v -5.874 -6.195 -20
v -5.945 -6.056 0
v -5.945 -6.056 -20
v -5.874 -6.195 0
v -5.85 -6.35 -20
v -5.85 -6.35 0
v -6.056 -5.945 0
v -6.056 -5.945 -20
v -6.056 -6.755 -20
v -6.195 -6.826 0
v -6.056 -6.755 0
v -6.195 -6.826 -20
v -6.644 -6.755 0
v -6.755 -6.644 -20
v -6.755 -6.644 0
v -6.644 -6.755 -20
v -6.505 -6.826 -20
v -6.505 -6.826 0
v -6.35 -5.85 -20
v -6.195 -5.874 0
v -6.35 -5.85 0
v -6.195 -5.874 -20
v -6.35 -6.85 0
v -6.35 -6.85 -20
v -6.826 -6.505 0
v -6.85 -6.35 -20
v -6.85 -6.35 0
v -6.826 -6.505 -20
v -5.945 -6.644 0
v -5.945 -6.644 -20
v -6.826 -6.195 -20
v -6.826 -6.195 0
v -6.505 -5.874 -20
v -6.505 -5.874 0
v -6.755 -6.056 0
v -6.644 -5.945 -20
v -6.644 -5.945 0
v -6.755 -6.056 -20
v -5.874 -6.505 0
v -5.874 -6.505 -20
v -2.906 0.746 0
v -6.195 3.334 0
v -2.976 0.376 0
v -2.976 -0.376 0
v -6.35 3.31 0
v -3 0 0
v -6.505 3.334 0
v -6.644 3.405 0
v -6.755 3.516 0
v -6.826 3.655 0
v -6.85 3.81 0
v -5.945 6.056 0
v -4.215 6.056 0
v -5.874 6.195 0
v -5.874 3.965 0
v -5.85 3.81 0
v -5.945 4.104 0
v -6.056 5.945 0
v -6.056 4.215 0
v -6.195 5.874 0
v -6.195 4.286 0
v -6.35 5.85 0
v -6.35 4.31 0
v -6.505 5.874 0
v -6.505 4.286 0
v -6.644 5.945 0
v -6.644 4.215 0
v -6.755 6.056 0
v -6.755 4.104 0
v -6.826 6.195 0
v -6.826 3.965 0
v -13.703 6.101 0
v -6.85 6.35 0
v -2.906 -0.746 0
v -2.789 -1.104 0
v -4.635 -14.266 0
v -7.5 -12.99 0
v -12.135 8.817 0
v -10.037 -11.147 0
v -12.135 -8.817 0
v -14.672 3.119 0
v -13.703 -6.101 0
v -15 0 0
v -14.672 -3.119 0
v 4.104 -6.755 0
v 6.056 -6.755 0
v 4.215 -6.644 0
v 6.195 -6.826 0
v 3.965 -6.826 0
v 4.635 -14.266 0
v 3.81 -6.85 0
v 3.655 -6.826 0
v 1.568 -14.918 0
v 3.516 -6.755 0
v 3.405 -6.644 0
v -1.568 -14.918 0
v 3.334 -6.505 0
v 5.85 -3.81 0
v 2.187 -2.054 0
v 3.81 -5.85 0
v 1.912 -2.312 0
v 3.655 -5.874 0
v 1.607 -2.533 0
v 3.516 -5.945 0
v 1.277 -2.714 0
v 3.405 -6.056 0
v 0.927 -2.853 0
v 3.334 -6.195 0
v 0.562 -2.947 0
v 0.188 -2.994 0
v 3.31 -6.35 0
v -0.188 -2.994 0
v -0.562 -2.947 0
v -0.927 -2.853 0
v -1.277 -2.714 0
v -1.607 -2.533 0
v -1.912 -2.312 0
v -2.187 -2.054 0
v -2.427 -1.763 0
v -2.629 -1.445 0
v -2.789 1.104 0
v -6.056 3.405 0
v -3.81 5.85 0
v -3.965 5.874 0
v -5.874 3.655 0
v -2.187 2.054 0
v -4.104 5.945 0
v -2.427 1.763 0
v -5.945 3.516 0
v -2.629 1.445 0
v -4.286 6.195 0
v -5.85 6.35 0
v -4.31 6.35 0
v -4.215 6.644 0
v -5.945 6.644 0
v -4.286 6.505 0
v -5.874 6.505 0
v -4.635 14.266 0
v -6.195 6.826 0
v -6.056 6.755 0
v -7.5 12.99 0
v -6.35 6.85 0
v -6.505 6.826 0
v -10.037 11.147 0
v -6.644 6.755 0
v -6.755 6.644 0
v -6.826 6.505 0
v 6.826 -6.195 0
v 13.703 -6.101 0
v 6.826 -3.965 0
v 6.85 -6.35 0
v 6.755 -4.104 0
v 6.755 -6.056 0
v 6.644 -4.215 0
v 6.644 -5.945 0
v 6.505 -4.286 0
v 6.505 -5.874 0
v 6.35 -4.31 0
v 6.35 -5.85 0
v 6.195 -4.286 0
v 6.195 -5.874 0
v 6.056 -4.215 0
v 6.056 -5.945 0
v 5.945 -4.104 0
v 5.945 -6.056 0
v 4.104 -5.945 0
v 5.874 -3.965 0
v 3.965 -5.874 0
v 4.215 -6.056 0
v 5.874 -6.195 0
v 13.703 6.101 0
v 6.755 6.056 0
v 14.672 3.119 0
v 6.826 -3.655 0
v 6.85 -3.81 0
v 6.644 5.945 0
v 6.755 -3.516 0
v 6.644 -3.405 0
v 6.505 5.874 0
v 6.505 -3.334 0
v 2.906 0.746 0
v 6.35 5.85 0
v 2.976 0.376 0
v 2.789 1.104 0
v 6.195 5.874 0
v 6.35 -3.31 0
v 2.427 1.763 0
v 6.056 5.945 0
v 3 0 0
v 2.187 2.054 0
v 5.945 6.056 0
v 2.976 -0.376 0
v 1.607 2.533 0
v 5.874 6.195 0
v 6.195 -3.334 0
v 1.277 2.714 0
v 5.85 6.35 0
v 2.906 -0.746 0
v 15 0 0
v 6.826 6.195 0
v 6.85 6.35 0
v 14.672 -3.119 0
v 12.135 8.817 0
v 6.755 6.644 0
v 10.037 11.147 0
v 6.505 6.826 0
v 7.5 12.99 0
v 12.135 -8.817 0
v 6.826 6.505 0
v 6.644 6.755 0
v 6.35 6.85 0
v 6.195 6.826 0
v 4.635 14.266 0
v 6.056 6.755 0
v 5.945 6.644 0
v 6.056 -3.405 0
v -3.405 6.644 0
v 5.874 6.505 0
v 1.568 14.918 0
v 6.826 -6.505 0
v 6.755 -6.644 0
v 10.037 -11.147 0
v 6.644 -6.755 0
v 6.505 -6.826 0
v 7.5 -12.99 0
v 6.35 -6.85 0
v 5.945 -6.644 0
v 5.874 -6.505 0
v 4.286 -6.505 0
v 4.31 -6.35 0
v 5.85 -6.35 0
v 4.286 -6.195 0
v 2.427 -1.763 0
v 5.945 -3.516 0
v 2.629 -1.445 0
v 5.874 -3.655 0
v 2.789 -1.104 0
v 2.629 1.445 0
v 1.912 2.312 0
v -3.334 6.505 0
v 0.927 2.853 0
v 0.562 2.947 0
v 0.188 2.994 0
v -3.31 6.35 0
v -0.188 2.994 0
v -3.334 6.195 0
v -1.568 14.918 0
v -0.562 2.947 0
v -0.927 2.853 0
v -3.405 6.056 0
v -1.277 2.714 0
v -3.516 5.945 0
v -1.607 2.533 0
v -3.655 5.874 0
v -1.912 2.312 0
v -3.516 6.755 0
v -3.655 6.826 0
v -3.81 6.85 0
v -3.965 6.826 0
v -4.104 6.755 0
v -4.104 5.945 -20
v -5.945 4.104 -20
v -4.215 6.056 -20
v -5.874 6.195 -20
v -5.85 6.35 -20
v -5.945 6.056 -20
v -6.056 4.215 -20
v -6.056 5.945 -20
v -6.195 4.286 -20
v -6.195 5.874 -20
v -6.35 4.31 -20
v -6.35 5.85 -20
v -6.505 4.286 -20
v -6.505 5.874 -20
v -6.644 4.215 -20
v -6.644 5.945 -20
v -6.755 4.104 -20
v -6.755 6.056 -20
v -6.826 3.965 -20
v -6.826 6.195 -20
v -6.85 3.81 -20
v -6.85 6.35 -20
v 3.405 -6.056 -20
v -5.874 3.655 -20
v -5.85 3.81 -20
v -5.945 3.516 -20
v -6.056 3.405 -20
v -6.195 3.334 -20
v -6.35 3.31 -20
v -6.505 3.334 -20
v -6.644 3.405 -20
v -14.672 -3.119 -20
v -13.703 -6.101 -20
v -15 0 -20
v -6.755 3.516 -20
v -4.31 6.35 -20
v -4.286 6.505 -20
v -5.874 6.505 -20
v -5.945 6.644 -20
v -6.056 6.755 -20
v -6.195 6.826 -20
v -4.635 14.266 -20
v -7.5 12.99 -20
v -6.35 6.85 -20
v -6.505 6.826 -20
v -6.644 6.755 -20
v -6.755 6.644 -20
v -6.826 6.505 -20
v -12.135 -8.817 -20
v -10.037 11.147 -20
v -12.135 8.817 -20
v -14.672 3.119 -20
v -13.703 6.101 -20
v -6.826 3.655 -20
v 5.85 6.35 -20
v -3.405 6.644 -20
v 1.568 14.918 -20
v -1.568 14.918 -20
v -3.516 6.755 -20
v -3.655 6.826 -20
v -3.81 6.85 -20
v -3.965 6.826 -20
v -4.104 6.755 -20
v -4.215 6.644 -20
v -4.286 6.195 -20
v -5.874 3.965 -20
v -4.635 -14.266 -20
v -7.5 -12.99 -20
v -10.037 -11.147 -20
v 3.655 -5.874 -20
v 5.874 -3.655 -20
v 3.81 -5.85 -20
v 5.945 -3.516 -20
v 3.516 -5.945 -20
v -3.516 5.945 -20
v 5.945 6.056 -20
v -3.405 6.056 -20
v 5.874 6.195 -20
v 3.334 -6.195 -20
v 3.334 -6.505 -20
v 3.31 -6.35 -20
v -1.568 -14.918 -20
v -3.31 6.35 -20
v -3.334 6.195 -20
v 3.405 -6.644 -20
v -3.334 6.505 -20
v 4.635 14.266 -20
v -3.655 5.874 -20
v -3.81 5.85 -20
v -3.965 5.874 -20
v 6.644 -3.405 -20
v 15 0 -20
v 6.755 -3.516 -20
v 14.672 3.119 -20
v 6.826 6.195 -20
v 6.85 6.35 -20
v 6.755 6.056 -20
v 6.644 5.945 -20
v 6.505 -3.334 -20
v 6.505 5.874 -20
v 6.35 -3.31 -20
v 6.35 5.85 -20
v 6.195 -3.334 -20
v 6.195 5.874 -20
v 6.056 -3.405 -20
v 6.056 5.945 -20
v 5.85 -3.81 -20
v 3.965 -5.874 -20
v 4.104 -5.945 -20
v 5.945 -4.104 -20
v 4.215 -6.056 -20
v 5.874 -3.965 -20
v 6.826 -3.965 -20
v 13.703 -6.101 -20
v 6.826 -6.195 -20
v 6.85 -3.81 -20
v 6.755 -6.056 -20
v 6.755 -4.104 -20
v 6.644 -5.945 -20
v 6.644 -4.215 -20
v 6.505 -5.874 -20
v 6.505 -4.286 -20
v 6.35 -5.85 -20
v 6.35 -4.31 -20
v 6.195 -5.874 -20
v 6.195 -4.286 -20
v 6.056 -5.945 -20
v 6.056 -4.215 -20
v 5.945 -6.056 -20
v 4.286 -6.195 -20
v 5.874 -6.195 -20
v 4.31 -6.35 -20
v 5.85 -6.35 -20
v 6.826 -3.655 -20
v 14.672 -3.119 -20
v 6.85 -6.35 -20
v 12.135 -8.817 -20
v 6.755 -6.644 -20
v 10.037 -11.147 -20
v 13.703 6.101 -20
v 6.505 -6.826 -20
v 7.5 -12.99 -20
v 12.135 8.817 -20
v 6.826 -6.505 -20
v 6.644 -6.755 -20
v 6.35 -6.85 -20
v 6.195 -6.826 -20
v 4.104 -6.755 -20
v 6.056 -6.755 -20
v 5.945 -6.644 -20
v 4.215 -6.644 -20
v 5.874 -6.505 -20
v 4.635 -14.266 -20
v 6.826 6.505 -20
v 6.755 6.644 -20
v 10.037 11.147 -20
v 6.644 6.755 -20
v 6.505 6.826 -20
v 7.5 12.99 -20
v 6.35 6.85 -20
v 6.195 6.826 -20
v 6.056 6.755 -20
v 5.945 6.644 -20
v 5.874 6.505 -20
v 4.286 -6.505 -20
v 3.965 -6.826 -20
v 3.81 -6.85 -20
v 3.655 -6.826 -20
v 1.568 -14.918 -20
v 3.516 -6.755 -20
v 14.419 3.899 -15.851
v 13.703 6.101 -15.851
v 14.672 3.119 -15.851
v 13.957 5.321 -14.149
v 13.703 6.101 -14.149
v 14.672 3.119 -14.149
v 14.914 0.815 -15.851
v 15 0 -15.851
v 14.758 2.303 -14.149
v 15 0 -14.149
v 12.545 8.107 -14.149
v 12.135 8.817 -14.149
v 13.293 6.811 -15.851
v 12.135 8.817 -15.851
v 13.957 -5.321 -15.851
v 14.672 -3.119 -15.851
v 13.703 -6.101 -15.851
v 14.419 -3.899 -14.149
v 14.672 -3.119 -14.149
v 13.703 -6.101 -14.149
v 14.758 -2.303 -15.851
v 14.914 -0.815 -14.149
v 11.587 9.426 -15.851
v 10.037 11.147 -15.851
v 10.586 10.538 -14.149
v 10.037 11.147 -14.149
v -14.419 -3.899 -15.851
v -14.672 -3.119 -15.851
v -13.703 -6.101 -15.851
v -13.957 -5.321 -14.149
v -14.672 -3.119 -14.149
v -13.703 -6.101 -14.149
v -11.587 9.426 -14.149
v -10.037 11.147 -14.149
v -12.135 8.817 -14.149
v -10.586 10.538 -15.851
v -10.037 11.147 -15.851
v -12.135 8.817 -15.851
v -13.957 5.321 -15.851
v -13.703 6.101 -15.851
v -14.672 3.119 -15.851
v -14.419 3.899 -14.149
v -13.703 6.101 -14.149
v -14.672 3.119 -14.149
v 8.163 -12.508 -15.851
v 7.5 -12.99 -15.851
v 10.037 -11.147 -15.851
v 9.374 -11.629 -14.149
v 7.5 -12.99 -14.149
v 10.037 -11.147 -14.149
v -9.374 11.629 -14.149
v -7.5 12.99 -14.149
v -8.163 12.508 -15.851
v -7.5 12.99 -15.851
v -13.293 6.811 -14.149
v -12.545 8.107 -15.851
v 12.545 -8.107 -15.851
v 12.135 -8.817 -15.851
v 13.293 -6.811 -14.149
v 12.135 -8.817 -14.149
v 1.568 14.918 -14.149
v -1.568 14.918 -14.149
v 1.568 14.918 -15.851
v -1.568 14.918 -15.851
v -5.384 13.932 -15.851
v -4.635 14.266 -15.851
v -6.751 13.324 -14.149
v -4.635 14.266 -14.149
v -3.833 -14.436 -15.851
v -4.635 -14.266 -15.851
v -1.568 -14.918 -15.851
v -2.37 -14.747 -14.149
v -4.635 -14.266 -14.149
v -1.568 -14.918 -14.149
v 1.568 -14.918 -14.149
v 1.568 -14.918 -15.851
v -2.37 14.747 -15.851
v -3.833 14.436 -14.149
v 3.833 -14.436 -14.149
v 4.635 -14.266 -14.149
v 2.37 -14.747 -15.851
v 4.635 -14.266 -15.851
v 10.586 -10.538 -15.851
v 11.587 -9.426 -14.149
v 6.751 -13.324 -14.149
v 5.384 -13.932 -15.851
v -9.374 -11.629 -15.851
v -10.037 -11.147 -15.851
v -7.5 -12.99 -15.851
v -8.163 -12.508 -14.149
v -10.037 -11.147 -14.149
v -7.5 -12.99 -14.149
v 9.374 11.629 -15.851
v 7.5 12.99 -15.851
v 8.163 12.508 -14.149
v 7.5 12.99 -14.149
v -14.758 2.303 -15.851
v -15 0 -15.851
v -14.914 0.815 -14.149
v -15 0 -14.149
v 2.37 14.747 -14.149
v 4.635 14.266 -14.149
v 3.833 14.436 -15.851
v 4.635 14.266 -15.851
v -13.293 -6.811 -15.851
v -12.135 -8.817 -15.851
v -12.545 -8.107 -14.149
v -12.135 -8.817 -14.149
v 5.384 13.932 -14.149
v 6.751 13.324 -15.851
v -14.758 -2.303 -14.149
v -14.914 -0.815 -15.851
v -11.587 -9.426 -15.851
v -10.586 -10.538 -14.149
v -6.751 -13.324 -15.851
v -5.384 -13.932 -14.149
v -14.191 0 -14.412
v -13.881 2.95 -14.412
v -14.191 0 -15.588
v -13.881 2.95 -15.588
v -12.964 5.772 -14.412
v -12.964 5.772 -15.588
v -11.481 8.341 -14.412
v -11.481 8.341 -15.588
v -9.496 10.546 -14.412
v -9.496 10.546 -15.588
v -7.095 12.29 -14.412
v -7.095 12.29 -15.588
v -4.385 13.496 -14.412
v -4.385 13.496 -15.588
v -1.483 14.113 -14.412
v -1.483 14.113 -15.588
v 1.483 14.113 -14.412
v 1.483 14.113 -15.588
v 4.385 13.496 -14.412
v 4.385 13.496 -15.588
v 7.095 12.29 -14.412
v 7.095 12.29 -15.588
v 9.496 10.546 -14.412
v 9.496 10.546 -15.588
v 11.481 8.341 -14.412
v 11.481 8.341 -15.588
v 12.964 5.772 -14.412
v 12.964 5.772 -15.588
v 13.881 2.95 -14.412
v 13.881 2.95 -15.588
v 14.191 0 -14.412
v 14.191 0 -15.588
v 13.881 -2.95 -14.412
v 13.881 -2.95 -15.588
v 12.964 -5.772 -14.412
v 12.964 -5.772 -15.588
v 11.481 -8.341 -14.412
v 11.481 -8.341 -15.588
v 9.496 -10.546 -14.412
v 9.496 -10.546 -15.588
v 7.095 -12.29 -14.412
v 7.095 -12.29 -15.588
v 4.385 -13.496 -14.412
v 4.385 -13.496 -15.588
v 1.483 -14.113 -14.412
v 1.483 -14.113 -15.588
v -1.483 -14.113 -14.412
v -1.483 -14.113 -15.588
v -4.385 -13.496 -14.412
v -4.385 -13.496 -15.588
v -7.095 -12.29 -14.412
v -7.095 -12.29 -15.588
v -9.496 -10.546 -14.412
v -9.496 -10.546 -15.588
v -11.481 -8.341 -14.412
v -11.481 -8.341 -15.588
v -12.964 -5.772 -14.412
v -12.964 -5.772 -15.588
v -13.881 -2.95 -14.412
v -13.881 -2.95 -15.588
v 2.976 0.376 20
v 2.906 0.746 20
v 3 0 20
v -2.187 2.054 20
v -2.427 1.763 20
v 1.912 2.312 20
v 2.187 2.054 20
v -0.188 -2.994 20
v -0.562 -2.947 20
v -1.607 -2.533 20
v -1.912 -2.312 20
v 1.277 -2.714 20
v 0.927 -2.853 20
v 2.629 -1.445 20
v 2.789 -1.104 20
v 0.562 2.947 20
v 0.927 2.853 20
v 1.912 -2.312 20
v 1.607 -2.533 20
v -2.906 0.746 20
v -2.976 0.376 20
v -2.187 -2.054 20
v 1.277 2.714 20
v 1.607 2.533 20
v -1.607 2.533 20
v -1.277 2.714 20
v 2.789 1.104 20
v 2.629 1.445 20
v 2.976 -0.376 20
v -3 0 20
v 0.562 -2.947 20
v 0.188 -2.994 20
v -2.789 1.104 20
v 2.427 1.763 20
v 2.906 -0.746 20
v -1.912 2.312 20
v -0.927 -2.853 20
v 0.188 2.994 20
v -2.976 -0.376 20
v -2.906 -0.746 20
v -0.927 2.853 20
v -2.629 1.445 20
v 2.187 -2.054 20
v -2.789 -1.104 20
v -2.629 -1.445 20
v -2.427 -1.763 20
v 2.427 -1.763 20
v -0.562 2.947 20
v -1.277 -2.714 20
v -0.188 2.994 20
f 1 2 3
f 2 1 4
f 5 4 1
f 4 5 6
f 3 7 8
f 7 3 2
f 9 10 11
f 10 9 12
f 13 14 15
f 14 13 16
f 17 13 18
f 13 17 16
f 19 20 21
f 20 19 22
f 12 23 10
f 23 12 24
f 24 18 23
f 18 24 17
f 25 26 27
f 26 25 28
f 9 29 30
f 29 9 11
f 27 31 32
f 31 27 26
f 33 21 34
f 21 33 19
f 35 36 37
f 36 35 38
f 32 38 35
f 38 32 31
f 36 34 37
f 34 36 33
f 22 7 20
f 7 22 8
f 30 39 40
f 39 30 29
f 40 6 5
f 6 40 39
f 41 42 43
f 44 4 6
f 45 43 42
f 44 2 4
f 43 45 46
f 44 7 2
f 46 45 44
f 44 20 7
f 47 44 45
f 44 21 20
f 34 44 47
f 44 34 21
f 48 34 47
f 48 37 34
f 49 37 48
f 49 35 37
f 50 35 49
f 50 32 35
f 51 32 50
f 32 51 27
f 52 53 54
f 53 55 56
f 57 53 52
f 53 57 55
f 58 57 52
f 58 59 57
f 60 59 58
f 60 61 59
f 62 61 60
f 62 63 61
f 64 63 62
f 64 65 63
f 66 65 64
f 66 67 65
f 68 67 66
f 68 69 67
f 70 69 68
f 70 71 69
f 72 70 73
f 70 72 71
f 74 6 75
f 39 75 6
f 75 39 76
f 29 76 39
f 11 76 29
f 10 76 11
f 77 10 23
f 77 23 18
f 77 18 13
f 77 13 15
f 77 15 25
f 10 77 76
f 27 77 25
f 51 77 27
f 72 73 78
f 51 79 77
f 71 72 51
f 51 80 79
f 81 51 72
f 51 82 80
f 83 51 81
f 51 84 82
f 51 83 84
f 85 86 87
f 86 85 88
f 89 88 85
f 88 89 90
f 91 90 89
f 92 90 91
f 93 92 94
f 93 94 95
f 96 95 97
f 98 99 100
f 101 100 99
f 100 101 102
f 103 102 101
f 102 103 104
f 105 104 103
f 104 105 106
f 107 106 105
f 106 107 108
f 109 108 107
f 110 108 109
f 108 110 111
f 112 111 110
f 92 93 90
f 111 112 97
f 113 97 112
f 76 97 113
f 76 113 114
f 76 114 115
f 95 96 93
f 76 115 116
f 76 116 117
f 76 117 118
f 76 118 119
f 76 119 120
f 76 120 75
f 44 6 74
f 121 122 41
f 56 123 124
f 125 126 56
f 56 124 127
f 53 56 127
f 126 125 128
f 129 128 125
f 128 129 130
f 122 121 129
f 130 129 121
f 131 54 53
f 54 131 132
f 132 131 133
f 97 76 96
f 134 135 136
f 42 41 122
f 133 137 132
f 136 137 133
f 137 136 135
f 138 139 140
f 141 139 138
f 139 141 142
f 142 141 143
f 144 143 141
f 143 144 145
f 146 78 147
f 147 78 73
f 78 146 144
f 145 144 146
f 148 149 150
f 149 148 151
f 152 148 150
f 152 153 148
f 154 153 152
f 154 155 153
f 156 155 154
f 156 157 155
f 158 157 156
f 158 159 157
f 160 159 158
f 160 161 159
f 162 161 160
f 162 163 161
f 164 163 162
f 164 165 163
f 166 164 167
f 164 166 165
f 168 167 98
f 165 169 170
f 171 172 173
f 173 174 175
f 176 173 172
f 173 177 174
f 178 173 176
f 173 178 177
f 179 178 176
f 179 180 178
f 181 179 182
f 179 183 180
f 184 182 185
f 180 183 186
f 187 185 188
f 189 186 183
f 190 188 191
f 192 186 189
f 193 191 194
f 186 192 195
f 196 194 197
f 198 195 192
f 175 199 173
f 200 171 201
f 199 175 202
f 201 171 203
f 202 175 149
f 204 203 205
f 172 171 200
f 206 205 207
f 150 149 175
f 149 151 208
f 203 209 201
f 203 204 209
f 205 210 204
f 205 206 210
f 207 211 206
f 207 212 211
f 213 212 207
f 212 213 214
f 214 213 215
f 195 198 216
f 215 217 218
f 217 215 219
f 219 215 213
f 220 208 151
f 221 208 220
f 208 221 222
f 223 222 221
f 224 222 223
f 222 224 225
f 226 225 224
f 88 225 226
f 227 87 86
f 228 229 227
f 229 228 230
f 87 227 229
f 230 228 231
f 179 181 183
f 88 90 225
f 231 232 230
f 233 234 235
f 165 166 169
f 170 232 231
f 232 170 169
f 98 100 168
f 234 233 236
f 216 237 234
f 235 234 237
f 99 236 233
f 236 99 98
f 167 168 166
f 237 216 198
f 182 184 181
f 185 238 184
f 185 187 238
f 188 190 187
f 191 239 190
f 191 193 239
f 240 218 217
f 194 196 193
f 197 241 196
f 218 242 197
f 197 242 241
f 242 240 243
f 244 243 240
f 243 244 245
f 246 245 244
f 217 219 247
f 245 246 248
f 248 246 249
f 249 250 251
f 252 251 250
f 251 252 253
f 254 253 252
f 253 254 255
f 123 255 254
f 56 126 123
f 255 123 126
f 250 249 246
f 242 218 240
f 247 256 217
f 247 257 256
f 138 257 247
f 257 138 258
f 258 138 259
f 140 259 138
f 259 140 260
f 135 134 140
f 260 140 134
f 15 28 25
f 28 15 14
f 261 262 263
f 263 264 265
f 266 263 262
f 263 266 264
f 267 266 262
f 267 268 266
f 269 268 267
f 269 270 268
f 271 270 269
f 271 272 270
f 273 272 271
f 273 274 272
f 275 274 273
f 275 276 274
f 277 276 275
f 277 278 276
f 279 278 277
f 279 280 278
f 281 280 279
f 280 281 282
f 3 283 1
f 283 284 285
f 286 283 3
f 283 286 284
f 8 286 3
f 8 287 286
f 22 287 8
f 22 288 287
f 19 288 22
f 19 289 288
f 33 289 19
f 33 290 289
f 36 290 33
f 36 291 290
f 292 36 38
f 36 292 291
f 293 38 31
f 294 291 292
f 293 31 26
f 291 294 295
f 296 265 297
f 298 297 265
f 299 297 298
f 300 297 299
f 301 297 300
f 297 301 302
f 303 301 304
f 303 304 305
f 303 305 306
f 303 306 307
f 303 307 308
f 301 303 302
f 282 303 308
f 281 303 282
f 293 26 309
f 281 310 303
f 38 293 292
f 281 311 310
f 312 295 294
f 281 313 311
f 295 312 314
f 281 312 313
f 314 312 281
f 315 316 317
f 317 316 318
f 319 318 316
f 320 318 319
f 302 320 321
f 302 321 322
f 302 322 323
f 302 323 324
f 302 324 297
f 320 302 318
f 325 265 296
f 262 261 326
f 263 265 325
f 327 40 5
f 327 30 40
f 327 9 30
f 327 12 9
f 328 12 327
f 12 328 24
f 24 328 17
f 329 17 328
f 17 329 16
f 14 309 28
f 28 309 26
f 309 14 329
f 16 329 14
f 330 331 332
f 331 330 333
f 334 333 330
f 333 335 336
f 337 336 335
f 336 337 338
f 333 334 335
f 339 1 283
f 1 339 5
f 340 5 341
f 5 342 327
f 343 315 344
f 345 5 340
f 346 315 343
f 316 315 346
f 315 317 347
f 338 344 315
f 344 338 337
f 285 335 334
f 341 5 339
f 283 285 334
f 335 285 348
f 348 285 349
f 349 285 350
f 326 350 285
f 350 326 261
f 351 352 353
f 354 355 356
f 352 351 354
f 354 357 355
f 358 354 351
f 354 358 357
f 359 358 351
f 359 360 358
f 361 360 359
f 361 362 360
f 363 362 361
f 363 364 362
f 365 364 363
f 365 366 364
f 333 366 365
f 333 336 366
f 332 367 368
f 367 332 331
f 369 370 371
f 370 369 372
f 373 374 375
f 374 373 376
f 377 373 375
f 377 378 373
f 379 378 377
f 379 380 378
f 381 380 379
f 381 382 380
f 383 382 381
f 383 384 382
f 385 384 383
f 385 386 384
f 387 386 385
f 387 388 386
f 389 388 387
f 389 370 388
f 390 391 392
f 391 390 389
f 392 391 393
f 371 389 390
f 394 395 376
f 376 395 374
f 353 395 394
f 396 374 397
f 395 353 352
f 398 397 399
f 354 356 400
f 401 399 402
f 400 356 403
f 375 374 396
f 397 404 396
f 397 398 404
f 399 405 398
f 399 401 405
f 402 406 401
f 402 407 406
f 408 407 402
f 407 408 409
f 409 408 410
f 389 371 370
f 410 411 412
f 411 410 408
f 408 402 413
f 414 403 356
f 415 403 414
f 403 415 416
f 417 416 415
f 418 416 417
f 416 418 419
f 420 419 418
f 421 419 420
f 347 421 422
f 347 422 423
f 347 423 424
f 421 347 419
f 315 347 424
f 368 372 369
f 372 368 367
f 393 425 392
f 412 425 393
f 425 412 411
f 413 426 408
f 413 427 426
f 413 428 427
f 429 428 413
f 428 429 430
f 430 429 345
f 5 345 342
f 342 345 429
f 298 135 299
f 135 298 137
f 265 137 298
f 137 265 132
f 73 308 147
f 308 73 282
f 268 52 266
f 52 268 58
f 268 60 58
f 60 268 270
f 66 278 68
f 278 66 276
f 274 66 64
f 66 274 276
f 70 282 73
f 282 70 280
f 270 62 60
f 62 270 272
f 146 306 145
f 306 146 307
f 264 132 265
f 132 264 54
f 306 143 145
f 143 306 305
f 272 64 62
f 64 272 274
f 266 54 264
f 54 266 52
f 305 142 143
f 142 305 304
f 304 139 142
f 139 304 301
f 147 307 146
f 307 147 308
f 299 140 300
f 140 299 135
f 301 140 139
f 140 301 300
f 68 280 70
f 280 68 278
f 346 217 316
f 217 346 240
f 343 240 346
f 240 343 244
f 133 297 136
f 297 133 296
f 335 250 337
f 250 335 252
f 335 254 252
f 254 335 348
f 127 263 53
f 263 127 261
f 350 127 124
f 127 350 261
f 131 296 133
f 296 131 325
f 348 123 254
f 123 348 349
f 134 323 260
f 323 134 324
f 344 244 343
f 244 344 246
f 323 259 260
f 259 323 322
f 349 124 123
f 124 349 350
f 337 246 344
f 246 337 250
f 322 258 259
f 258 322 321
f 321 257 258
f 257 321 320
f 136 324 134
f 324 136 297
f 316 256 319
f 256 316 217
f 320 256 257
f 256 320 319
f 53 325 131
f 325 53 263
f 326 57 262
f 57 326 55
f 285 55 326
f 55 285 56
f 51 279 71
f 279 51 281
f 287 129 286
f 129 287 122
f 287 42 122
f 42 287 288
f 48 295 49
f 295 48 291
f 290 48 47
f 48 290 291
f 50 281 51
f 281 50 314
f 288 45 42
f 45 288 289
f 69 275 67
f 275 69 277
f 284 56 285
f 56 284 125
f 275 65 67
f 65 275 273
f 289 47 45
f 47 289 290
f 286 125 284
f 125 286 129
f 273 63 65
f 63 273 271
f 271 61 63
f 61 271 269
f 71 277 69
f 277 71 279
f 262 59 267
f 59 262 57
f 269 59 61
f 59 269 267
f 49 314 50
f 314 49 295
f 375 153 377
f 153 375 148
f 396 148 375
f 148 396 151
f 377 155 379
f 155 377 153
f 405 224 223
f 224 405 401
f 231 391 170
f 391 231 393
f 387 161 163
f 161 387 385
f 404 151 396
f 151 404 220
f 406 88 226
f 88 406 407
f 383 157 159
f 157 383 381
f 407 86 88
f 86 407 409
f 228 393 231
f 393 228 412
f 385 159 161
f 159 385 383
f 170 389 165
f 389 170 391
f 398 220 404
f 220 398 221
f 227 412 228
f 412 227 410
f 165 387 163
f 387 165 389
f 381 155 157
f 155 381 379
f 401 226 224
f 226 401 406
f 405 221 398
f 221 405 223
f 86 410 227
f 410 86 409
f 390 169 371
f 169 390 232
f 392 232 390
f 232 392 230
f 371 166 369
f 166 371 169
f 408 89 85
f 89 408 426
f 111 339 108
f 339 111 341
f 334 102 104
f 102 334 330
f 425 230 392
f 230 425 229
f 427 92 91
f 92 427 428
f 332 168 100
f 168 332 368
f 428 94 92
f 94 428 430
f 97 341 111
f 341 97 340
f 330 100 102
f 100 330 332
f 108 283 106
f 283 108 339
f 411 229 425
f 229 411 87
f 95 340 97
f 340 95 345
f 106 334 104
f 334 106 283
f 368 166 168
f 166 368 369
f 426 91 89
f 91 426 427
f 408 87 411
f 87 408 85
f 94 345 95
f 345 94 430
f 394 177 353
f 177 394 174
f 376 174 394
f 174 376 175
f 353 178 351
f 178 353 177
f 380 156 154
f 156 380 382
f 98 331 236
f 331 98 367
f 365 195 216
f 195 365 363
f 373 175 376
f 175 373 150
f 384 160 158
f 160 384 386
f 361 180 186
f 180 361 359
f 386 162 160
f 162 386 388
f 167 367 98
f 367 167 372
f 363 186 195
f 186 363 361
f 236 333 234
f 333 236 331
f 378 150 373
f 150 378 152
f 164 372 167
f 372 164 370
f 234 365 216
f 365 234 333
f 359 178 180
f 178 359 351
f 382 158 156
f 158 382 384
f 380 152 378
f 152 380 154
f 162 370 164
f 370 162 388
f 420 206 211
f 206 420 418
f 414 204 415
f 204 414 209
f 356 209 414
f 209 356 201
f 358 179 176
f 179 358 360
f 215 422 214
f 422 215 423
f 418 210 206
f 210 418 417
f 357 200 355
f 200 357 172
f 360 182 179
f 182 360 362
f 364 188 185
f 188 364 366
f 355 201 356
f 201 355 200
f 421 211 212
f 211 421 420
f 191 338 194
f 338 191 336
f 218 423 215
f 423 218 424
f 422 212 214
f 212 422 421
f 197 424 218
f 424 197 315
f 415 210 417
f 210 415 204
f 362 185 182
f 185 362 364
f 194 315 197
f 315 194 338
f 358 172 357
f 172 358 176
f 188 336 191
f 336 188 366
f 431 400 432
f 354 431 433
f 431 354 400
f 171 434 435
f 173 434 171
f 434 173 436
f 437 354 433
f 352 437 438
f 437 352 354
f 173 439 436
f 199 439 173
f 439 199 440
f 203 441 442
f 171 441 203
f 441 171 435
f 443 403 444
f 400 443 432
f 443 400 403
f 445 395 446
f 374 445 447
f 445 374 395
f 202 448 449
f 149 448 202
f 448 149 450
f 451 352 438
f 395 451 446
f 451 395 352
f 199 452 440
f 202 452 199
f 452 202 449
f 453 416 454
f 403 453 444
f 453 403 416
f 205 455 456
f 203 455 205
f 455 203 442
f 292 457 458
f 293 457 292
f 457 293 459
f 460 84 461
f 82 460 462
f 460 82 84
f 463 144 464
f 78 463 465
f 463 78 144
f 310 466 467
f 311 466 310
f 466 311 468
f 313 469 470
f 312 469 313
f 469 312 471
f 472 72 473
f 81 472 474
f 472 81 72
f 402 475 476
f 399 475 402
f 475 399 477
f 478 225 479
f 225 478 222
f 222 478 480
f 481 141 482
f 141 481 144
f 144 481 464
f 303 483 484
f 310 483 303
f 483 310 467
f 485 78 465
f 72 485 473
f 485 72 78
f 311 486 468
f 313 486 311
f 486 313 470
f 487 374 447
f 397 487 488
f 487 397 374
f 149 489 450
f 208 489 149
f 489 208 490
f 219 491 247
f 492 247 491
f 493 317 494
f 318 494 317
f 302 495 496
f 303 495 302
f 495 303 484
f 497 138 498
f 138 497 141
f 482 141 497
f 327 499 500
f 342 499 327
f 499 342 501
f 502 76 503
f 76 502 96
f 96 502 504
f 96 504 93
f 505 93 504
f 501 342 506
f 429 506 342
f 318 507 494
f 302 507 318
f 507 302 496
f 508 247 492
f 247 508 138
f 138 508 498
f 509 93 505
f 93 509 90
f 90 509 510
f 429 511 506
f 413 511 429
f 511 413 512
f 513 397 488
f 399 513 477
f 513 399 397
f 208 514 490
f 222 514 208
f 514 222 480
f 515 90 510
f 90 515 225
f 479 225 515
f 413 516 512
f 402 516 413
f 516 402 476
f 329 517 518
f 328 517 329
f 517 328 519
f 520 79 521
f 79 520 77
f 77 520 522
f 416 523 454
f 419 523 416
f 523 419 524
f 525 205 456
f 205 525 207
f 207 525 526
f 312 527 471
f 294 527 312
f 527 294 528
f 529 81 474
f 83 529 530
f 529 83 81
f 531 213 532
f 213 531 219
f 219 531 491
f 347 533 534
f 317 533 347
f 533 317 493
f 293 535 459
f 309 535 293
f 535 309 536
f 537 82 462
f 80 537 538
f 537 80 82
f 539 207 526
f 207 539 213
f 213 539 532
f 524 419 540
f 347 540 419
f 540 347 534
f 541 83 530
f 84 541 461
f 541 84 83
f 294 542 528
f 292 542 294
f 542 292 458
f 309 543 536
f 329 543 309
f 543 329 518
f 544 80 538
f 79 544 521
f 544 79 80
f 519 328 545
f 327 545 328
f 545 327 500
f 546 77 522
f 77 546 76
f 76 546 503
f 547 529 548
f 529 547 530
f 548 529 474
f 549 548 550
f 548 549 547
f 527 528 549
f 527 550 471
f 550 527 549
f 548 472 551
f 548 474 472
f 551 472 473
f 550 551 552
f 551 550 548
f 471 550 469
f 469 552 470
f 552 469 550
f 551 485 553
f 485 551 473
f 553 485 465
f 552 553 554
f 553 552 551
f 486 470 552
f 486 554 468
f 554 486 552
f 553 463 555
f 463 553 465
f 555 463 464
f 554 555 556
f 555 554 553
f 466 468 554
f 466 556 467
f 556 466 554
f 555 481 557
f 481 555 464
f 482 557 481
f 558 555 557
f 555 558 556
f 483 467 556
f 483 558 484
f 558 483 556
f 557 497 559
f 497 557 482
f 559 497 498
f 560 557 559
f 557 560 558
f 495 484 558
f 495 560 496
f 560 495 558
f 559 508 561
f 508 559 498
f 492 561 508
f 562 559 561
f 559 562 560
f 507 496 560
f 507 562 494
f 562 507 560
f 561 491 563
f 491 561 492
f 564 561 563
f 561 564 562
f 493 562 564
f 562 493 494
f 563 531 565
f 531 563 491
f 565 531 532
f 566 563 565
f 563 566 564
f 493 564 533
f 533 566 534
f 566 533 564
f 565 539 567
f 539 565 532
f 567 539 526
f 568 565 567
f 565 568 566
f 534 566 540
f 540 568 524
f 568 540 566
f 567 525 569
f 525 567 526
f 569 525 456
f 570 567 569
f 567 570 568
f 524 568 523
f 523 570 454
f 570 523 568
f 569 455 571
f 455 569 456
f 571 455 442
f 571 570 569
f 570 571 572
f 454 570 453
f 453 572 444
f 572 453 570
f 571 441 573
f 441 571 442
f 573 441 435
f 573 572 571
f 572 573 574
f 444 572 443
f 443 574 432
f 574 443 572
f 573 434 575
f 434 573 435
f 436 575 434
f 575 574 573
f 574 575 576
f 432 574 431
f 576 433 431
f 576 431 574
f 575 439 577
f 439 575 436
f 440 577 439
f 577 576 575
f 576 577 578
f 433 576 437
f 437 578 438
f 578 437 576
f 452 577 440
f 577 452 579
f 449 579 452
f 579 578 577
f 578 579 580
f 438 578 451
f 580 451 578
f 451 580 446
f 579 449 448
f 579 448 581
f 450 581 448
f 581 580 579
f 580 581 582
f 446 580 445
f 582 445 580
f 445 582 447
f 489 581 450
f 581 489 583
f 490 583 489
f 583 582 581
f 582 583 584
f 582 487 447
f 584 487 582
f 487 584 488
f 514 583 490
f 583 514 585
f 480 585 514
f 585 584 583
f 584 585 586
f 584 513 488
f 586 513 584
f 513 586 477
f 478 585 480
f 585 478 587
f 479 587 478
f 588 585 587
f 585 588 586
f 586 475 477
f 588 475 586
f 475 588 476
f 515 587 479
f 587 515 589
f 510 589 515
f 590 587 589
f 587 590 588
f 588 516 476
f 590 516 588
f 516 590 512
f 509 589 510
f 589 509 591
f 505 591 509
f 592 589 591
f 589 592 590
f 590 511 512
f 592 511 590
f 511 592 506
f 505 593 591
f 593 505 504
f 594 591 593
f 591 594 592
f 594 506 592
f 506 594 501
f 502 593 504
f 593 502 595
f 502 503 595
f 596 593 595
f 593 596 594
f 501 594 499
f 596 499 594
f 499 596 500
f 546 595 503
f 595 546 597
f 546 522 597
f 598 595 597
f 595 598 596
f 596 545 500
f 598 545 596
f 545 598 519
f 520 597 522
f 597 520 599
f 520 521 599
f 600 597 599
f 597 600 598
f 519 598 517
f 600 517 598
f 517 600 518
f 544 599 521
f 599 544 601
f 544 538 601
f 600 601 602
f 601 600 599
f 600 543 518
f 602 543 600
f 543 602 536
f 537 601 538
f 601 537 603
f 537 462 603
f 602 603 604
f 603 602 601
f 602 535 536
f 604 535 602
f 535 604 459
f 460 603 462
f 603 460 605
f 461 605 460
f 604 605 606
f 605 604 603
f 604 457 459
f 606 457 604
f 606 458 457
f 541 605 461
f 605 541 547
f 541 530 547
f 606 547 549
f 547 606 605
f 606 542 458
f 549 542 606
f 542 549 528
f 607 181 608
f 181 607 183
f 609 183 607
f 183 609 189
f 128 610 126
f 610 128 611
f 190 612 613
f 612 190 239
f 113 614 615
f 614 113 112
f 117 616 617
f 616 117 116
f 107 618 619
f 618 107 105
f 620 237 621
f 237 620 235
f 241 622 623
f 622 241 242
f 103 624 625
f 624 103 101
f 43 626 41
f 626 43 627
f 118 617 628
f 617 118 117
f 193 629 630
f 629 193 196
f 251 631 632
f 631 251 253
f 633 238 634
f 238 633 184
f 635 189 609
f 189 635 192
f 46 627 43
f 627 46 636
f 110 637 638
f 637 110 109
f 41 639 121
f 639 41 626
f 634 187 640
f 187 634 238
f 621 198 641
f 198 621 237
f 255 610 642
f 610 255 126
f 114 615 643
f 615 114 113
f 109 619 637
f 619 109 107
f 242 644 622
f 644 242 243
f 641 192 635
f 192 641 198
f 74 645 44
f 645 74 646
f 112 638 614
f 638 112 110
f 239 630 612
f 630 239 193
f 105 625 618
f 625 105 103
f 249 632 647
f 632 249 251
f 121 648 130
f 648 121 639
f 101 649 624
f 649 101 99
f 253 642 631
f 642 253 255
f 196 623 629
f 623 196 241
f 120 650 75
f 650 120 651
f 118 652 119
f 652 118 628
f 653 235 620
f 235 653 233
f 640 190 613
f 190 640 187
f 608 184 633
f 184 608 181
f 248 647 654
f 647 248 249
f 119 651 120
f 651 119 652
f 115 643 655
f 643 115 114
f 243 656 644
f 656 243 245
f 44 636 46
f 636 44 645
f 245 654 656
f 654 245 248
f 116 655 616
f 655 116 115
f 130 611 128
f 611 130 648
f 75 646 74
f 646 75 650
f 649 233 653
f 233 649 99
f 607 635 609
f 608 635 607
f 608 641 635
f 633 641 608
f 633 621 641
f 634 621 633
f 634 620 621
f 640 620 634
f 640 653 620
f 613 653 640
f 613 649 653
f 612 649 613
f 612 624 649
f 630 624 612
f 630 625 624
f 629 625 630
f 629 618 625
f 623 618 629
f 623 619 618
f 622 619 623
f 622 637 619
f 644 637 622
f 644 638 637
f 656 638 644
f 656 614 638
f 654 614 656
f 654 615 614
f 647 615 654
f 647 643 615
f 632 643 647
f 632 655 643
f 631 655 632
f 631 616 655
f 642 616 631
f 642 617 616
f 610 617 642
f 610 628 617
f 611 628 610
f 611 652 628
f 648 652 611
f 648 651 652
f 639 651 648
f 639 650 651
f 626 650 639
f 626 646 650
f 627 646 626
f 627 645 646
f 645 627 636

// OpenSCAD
include <MCAD/constants.scad>;

rm_height = 20;
rm_diameter = 6;

pin_position =  [ [ -0.25 * mm_per_inch, -0.25 * mm_per_inch, 0] ,
                  [ -0.25 * mm_per_inch, 0.25 * mm_per_inch, 0] ,
                  [ -0.15 * mm_per_inch, 0.25 * mm_per_inch, 0] ,
                  [ -0.25 * mm_per_inch, 0.15 * mm_per_inch, 0] ,
                  [ 0.25 * mm_per_inch, -0.25 * mm_per_inch, 0] ,
                  [ 0.15 * mm_per_inch, -0.25 * mm_per_inch, 0] ,
                  [ 0.25 * mm_per_inch, -0.15 * mm_per_inch, 0] ,
                  [ 0.25 * mm_per_inch, 0.25 * mm_per_inch, 0] ];

base_height = 20;
base_diameter = 30;

hole_diameter = 1;
hole_radius = (hole_diameter/2);

belt_radius = 1;


cylinder(h = rm_height, r=(rm_diameter)/2, $fn=50);

translate([0,0,-rm_height]) {
    
   difference() {
        // main body
        cylinder(h = base_height, r=(base_diameter/2));

        // belt channel
        rotate_extrude() translate([base_diameter/2, base_height/4, 0]) circle(belt_radius);

        // coil former holes
        for( i = [0:len(pin_position)-1] ) {
            translate(pin_position[i]) {
                cylinder(h = base_height, r = hole_radius, $fn=20);
            }
        }
    }
}
